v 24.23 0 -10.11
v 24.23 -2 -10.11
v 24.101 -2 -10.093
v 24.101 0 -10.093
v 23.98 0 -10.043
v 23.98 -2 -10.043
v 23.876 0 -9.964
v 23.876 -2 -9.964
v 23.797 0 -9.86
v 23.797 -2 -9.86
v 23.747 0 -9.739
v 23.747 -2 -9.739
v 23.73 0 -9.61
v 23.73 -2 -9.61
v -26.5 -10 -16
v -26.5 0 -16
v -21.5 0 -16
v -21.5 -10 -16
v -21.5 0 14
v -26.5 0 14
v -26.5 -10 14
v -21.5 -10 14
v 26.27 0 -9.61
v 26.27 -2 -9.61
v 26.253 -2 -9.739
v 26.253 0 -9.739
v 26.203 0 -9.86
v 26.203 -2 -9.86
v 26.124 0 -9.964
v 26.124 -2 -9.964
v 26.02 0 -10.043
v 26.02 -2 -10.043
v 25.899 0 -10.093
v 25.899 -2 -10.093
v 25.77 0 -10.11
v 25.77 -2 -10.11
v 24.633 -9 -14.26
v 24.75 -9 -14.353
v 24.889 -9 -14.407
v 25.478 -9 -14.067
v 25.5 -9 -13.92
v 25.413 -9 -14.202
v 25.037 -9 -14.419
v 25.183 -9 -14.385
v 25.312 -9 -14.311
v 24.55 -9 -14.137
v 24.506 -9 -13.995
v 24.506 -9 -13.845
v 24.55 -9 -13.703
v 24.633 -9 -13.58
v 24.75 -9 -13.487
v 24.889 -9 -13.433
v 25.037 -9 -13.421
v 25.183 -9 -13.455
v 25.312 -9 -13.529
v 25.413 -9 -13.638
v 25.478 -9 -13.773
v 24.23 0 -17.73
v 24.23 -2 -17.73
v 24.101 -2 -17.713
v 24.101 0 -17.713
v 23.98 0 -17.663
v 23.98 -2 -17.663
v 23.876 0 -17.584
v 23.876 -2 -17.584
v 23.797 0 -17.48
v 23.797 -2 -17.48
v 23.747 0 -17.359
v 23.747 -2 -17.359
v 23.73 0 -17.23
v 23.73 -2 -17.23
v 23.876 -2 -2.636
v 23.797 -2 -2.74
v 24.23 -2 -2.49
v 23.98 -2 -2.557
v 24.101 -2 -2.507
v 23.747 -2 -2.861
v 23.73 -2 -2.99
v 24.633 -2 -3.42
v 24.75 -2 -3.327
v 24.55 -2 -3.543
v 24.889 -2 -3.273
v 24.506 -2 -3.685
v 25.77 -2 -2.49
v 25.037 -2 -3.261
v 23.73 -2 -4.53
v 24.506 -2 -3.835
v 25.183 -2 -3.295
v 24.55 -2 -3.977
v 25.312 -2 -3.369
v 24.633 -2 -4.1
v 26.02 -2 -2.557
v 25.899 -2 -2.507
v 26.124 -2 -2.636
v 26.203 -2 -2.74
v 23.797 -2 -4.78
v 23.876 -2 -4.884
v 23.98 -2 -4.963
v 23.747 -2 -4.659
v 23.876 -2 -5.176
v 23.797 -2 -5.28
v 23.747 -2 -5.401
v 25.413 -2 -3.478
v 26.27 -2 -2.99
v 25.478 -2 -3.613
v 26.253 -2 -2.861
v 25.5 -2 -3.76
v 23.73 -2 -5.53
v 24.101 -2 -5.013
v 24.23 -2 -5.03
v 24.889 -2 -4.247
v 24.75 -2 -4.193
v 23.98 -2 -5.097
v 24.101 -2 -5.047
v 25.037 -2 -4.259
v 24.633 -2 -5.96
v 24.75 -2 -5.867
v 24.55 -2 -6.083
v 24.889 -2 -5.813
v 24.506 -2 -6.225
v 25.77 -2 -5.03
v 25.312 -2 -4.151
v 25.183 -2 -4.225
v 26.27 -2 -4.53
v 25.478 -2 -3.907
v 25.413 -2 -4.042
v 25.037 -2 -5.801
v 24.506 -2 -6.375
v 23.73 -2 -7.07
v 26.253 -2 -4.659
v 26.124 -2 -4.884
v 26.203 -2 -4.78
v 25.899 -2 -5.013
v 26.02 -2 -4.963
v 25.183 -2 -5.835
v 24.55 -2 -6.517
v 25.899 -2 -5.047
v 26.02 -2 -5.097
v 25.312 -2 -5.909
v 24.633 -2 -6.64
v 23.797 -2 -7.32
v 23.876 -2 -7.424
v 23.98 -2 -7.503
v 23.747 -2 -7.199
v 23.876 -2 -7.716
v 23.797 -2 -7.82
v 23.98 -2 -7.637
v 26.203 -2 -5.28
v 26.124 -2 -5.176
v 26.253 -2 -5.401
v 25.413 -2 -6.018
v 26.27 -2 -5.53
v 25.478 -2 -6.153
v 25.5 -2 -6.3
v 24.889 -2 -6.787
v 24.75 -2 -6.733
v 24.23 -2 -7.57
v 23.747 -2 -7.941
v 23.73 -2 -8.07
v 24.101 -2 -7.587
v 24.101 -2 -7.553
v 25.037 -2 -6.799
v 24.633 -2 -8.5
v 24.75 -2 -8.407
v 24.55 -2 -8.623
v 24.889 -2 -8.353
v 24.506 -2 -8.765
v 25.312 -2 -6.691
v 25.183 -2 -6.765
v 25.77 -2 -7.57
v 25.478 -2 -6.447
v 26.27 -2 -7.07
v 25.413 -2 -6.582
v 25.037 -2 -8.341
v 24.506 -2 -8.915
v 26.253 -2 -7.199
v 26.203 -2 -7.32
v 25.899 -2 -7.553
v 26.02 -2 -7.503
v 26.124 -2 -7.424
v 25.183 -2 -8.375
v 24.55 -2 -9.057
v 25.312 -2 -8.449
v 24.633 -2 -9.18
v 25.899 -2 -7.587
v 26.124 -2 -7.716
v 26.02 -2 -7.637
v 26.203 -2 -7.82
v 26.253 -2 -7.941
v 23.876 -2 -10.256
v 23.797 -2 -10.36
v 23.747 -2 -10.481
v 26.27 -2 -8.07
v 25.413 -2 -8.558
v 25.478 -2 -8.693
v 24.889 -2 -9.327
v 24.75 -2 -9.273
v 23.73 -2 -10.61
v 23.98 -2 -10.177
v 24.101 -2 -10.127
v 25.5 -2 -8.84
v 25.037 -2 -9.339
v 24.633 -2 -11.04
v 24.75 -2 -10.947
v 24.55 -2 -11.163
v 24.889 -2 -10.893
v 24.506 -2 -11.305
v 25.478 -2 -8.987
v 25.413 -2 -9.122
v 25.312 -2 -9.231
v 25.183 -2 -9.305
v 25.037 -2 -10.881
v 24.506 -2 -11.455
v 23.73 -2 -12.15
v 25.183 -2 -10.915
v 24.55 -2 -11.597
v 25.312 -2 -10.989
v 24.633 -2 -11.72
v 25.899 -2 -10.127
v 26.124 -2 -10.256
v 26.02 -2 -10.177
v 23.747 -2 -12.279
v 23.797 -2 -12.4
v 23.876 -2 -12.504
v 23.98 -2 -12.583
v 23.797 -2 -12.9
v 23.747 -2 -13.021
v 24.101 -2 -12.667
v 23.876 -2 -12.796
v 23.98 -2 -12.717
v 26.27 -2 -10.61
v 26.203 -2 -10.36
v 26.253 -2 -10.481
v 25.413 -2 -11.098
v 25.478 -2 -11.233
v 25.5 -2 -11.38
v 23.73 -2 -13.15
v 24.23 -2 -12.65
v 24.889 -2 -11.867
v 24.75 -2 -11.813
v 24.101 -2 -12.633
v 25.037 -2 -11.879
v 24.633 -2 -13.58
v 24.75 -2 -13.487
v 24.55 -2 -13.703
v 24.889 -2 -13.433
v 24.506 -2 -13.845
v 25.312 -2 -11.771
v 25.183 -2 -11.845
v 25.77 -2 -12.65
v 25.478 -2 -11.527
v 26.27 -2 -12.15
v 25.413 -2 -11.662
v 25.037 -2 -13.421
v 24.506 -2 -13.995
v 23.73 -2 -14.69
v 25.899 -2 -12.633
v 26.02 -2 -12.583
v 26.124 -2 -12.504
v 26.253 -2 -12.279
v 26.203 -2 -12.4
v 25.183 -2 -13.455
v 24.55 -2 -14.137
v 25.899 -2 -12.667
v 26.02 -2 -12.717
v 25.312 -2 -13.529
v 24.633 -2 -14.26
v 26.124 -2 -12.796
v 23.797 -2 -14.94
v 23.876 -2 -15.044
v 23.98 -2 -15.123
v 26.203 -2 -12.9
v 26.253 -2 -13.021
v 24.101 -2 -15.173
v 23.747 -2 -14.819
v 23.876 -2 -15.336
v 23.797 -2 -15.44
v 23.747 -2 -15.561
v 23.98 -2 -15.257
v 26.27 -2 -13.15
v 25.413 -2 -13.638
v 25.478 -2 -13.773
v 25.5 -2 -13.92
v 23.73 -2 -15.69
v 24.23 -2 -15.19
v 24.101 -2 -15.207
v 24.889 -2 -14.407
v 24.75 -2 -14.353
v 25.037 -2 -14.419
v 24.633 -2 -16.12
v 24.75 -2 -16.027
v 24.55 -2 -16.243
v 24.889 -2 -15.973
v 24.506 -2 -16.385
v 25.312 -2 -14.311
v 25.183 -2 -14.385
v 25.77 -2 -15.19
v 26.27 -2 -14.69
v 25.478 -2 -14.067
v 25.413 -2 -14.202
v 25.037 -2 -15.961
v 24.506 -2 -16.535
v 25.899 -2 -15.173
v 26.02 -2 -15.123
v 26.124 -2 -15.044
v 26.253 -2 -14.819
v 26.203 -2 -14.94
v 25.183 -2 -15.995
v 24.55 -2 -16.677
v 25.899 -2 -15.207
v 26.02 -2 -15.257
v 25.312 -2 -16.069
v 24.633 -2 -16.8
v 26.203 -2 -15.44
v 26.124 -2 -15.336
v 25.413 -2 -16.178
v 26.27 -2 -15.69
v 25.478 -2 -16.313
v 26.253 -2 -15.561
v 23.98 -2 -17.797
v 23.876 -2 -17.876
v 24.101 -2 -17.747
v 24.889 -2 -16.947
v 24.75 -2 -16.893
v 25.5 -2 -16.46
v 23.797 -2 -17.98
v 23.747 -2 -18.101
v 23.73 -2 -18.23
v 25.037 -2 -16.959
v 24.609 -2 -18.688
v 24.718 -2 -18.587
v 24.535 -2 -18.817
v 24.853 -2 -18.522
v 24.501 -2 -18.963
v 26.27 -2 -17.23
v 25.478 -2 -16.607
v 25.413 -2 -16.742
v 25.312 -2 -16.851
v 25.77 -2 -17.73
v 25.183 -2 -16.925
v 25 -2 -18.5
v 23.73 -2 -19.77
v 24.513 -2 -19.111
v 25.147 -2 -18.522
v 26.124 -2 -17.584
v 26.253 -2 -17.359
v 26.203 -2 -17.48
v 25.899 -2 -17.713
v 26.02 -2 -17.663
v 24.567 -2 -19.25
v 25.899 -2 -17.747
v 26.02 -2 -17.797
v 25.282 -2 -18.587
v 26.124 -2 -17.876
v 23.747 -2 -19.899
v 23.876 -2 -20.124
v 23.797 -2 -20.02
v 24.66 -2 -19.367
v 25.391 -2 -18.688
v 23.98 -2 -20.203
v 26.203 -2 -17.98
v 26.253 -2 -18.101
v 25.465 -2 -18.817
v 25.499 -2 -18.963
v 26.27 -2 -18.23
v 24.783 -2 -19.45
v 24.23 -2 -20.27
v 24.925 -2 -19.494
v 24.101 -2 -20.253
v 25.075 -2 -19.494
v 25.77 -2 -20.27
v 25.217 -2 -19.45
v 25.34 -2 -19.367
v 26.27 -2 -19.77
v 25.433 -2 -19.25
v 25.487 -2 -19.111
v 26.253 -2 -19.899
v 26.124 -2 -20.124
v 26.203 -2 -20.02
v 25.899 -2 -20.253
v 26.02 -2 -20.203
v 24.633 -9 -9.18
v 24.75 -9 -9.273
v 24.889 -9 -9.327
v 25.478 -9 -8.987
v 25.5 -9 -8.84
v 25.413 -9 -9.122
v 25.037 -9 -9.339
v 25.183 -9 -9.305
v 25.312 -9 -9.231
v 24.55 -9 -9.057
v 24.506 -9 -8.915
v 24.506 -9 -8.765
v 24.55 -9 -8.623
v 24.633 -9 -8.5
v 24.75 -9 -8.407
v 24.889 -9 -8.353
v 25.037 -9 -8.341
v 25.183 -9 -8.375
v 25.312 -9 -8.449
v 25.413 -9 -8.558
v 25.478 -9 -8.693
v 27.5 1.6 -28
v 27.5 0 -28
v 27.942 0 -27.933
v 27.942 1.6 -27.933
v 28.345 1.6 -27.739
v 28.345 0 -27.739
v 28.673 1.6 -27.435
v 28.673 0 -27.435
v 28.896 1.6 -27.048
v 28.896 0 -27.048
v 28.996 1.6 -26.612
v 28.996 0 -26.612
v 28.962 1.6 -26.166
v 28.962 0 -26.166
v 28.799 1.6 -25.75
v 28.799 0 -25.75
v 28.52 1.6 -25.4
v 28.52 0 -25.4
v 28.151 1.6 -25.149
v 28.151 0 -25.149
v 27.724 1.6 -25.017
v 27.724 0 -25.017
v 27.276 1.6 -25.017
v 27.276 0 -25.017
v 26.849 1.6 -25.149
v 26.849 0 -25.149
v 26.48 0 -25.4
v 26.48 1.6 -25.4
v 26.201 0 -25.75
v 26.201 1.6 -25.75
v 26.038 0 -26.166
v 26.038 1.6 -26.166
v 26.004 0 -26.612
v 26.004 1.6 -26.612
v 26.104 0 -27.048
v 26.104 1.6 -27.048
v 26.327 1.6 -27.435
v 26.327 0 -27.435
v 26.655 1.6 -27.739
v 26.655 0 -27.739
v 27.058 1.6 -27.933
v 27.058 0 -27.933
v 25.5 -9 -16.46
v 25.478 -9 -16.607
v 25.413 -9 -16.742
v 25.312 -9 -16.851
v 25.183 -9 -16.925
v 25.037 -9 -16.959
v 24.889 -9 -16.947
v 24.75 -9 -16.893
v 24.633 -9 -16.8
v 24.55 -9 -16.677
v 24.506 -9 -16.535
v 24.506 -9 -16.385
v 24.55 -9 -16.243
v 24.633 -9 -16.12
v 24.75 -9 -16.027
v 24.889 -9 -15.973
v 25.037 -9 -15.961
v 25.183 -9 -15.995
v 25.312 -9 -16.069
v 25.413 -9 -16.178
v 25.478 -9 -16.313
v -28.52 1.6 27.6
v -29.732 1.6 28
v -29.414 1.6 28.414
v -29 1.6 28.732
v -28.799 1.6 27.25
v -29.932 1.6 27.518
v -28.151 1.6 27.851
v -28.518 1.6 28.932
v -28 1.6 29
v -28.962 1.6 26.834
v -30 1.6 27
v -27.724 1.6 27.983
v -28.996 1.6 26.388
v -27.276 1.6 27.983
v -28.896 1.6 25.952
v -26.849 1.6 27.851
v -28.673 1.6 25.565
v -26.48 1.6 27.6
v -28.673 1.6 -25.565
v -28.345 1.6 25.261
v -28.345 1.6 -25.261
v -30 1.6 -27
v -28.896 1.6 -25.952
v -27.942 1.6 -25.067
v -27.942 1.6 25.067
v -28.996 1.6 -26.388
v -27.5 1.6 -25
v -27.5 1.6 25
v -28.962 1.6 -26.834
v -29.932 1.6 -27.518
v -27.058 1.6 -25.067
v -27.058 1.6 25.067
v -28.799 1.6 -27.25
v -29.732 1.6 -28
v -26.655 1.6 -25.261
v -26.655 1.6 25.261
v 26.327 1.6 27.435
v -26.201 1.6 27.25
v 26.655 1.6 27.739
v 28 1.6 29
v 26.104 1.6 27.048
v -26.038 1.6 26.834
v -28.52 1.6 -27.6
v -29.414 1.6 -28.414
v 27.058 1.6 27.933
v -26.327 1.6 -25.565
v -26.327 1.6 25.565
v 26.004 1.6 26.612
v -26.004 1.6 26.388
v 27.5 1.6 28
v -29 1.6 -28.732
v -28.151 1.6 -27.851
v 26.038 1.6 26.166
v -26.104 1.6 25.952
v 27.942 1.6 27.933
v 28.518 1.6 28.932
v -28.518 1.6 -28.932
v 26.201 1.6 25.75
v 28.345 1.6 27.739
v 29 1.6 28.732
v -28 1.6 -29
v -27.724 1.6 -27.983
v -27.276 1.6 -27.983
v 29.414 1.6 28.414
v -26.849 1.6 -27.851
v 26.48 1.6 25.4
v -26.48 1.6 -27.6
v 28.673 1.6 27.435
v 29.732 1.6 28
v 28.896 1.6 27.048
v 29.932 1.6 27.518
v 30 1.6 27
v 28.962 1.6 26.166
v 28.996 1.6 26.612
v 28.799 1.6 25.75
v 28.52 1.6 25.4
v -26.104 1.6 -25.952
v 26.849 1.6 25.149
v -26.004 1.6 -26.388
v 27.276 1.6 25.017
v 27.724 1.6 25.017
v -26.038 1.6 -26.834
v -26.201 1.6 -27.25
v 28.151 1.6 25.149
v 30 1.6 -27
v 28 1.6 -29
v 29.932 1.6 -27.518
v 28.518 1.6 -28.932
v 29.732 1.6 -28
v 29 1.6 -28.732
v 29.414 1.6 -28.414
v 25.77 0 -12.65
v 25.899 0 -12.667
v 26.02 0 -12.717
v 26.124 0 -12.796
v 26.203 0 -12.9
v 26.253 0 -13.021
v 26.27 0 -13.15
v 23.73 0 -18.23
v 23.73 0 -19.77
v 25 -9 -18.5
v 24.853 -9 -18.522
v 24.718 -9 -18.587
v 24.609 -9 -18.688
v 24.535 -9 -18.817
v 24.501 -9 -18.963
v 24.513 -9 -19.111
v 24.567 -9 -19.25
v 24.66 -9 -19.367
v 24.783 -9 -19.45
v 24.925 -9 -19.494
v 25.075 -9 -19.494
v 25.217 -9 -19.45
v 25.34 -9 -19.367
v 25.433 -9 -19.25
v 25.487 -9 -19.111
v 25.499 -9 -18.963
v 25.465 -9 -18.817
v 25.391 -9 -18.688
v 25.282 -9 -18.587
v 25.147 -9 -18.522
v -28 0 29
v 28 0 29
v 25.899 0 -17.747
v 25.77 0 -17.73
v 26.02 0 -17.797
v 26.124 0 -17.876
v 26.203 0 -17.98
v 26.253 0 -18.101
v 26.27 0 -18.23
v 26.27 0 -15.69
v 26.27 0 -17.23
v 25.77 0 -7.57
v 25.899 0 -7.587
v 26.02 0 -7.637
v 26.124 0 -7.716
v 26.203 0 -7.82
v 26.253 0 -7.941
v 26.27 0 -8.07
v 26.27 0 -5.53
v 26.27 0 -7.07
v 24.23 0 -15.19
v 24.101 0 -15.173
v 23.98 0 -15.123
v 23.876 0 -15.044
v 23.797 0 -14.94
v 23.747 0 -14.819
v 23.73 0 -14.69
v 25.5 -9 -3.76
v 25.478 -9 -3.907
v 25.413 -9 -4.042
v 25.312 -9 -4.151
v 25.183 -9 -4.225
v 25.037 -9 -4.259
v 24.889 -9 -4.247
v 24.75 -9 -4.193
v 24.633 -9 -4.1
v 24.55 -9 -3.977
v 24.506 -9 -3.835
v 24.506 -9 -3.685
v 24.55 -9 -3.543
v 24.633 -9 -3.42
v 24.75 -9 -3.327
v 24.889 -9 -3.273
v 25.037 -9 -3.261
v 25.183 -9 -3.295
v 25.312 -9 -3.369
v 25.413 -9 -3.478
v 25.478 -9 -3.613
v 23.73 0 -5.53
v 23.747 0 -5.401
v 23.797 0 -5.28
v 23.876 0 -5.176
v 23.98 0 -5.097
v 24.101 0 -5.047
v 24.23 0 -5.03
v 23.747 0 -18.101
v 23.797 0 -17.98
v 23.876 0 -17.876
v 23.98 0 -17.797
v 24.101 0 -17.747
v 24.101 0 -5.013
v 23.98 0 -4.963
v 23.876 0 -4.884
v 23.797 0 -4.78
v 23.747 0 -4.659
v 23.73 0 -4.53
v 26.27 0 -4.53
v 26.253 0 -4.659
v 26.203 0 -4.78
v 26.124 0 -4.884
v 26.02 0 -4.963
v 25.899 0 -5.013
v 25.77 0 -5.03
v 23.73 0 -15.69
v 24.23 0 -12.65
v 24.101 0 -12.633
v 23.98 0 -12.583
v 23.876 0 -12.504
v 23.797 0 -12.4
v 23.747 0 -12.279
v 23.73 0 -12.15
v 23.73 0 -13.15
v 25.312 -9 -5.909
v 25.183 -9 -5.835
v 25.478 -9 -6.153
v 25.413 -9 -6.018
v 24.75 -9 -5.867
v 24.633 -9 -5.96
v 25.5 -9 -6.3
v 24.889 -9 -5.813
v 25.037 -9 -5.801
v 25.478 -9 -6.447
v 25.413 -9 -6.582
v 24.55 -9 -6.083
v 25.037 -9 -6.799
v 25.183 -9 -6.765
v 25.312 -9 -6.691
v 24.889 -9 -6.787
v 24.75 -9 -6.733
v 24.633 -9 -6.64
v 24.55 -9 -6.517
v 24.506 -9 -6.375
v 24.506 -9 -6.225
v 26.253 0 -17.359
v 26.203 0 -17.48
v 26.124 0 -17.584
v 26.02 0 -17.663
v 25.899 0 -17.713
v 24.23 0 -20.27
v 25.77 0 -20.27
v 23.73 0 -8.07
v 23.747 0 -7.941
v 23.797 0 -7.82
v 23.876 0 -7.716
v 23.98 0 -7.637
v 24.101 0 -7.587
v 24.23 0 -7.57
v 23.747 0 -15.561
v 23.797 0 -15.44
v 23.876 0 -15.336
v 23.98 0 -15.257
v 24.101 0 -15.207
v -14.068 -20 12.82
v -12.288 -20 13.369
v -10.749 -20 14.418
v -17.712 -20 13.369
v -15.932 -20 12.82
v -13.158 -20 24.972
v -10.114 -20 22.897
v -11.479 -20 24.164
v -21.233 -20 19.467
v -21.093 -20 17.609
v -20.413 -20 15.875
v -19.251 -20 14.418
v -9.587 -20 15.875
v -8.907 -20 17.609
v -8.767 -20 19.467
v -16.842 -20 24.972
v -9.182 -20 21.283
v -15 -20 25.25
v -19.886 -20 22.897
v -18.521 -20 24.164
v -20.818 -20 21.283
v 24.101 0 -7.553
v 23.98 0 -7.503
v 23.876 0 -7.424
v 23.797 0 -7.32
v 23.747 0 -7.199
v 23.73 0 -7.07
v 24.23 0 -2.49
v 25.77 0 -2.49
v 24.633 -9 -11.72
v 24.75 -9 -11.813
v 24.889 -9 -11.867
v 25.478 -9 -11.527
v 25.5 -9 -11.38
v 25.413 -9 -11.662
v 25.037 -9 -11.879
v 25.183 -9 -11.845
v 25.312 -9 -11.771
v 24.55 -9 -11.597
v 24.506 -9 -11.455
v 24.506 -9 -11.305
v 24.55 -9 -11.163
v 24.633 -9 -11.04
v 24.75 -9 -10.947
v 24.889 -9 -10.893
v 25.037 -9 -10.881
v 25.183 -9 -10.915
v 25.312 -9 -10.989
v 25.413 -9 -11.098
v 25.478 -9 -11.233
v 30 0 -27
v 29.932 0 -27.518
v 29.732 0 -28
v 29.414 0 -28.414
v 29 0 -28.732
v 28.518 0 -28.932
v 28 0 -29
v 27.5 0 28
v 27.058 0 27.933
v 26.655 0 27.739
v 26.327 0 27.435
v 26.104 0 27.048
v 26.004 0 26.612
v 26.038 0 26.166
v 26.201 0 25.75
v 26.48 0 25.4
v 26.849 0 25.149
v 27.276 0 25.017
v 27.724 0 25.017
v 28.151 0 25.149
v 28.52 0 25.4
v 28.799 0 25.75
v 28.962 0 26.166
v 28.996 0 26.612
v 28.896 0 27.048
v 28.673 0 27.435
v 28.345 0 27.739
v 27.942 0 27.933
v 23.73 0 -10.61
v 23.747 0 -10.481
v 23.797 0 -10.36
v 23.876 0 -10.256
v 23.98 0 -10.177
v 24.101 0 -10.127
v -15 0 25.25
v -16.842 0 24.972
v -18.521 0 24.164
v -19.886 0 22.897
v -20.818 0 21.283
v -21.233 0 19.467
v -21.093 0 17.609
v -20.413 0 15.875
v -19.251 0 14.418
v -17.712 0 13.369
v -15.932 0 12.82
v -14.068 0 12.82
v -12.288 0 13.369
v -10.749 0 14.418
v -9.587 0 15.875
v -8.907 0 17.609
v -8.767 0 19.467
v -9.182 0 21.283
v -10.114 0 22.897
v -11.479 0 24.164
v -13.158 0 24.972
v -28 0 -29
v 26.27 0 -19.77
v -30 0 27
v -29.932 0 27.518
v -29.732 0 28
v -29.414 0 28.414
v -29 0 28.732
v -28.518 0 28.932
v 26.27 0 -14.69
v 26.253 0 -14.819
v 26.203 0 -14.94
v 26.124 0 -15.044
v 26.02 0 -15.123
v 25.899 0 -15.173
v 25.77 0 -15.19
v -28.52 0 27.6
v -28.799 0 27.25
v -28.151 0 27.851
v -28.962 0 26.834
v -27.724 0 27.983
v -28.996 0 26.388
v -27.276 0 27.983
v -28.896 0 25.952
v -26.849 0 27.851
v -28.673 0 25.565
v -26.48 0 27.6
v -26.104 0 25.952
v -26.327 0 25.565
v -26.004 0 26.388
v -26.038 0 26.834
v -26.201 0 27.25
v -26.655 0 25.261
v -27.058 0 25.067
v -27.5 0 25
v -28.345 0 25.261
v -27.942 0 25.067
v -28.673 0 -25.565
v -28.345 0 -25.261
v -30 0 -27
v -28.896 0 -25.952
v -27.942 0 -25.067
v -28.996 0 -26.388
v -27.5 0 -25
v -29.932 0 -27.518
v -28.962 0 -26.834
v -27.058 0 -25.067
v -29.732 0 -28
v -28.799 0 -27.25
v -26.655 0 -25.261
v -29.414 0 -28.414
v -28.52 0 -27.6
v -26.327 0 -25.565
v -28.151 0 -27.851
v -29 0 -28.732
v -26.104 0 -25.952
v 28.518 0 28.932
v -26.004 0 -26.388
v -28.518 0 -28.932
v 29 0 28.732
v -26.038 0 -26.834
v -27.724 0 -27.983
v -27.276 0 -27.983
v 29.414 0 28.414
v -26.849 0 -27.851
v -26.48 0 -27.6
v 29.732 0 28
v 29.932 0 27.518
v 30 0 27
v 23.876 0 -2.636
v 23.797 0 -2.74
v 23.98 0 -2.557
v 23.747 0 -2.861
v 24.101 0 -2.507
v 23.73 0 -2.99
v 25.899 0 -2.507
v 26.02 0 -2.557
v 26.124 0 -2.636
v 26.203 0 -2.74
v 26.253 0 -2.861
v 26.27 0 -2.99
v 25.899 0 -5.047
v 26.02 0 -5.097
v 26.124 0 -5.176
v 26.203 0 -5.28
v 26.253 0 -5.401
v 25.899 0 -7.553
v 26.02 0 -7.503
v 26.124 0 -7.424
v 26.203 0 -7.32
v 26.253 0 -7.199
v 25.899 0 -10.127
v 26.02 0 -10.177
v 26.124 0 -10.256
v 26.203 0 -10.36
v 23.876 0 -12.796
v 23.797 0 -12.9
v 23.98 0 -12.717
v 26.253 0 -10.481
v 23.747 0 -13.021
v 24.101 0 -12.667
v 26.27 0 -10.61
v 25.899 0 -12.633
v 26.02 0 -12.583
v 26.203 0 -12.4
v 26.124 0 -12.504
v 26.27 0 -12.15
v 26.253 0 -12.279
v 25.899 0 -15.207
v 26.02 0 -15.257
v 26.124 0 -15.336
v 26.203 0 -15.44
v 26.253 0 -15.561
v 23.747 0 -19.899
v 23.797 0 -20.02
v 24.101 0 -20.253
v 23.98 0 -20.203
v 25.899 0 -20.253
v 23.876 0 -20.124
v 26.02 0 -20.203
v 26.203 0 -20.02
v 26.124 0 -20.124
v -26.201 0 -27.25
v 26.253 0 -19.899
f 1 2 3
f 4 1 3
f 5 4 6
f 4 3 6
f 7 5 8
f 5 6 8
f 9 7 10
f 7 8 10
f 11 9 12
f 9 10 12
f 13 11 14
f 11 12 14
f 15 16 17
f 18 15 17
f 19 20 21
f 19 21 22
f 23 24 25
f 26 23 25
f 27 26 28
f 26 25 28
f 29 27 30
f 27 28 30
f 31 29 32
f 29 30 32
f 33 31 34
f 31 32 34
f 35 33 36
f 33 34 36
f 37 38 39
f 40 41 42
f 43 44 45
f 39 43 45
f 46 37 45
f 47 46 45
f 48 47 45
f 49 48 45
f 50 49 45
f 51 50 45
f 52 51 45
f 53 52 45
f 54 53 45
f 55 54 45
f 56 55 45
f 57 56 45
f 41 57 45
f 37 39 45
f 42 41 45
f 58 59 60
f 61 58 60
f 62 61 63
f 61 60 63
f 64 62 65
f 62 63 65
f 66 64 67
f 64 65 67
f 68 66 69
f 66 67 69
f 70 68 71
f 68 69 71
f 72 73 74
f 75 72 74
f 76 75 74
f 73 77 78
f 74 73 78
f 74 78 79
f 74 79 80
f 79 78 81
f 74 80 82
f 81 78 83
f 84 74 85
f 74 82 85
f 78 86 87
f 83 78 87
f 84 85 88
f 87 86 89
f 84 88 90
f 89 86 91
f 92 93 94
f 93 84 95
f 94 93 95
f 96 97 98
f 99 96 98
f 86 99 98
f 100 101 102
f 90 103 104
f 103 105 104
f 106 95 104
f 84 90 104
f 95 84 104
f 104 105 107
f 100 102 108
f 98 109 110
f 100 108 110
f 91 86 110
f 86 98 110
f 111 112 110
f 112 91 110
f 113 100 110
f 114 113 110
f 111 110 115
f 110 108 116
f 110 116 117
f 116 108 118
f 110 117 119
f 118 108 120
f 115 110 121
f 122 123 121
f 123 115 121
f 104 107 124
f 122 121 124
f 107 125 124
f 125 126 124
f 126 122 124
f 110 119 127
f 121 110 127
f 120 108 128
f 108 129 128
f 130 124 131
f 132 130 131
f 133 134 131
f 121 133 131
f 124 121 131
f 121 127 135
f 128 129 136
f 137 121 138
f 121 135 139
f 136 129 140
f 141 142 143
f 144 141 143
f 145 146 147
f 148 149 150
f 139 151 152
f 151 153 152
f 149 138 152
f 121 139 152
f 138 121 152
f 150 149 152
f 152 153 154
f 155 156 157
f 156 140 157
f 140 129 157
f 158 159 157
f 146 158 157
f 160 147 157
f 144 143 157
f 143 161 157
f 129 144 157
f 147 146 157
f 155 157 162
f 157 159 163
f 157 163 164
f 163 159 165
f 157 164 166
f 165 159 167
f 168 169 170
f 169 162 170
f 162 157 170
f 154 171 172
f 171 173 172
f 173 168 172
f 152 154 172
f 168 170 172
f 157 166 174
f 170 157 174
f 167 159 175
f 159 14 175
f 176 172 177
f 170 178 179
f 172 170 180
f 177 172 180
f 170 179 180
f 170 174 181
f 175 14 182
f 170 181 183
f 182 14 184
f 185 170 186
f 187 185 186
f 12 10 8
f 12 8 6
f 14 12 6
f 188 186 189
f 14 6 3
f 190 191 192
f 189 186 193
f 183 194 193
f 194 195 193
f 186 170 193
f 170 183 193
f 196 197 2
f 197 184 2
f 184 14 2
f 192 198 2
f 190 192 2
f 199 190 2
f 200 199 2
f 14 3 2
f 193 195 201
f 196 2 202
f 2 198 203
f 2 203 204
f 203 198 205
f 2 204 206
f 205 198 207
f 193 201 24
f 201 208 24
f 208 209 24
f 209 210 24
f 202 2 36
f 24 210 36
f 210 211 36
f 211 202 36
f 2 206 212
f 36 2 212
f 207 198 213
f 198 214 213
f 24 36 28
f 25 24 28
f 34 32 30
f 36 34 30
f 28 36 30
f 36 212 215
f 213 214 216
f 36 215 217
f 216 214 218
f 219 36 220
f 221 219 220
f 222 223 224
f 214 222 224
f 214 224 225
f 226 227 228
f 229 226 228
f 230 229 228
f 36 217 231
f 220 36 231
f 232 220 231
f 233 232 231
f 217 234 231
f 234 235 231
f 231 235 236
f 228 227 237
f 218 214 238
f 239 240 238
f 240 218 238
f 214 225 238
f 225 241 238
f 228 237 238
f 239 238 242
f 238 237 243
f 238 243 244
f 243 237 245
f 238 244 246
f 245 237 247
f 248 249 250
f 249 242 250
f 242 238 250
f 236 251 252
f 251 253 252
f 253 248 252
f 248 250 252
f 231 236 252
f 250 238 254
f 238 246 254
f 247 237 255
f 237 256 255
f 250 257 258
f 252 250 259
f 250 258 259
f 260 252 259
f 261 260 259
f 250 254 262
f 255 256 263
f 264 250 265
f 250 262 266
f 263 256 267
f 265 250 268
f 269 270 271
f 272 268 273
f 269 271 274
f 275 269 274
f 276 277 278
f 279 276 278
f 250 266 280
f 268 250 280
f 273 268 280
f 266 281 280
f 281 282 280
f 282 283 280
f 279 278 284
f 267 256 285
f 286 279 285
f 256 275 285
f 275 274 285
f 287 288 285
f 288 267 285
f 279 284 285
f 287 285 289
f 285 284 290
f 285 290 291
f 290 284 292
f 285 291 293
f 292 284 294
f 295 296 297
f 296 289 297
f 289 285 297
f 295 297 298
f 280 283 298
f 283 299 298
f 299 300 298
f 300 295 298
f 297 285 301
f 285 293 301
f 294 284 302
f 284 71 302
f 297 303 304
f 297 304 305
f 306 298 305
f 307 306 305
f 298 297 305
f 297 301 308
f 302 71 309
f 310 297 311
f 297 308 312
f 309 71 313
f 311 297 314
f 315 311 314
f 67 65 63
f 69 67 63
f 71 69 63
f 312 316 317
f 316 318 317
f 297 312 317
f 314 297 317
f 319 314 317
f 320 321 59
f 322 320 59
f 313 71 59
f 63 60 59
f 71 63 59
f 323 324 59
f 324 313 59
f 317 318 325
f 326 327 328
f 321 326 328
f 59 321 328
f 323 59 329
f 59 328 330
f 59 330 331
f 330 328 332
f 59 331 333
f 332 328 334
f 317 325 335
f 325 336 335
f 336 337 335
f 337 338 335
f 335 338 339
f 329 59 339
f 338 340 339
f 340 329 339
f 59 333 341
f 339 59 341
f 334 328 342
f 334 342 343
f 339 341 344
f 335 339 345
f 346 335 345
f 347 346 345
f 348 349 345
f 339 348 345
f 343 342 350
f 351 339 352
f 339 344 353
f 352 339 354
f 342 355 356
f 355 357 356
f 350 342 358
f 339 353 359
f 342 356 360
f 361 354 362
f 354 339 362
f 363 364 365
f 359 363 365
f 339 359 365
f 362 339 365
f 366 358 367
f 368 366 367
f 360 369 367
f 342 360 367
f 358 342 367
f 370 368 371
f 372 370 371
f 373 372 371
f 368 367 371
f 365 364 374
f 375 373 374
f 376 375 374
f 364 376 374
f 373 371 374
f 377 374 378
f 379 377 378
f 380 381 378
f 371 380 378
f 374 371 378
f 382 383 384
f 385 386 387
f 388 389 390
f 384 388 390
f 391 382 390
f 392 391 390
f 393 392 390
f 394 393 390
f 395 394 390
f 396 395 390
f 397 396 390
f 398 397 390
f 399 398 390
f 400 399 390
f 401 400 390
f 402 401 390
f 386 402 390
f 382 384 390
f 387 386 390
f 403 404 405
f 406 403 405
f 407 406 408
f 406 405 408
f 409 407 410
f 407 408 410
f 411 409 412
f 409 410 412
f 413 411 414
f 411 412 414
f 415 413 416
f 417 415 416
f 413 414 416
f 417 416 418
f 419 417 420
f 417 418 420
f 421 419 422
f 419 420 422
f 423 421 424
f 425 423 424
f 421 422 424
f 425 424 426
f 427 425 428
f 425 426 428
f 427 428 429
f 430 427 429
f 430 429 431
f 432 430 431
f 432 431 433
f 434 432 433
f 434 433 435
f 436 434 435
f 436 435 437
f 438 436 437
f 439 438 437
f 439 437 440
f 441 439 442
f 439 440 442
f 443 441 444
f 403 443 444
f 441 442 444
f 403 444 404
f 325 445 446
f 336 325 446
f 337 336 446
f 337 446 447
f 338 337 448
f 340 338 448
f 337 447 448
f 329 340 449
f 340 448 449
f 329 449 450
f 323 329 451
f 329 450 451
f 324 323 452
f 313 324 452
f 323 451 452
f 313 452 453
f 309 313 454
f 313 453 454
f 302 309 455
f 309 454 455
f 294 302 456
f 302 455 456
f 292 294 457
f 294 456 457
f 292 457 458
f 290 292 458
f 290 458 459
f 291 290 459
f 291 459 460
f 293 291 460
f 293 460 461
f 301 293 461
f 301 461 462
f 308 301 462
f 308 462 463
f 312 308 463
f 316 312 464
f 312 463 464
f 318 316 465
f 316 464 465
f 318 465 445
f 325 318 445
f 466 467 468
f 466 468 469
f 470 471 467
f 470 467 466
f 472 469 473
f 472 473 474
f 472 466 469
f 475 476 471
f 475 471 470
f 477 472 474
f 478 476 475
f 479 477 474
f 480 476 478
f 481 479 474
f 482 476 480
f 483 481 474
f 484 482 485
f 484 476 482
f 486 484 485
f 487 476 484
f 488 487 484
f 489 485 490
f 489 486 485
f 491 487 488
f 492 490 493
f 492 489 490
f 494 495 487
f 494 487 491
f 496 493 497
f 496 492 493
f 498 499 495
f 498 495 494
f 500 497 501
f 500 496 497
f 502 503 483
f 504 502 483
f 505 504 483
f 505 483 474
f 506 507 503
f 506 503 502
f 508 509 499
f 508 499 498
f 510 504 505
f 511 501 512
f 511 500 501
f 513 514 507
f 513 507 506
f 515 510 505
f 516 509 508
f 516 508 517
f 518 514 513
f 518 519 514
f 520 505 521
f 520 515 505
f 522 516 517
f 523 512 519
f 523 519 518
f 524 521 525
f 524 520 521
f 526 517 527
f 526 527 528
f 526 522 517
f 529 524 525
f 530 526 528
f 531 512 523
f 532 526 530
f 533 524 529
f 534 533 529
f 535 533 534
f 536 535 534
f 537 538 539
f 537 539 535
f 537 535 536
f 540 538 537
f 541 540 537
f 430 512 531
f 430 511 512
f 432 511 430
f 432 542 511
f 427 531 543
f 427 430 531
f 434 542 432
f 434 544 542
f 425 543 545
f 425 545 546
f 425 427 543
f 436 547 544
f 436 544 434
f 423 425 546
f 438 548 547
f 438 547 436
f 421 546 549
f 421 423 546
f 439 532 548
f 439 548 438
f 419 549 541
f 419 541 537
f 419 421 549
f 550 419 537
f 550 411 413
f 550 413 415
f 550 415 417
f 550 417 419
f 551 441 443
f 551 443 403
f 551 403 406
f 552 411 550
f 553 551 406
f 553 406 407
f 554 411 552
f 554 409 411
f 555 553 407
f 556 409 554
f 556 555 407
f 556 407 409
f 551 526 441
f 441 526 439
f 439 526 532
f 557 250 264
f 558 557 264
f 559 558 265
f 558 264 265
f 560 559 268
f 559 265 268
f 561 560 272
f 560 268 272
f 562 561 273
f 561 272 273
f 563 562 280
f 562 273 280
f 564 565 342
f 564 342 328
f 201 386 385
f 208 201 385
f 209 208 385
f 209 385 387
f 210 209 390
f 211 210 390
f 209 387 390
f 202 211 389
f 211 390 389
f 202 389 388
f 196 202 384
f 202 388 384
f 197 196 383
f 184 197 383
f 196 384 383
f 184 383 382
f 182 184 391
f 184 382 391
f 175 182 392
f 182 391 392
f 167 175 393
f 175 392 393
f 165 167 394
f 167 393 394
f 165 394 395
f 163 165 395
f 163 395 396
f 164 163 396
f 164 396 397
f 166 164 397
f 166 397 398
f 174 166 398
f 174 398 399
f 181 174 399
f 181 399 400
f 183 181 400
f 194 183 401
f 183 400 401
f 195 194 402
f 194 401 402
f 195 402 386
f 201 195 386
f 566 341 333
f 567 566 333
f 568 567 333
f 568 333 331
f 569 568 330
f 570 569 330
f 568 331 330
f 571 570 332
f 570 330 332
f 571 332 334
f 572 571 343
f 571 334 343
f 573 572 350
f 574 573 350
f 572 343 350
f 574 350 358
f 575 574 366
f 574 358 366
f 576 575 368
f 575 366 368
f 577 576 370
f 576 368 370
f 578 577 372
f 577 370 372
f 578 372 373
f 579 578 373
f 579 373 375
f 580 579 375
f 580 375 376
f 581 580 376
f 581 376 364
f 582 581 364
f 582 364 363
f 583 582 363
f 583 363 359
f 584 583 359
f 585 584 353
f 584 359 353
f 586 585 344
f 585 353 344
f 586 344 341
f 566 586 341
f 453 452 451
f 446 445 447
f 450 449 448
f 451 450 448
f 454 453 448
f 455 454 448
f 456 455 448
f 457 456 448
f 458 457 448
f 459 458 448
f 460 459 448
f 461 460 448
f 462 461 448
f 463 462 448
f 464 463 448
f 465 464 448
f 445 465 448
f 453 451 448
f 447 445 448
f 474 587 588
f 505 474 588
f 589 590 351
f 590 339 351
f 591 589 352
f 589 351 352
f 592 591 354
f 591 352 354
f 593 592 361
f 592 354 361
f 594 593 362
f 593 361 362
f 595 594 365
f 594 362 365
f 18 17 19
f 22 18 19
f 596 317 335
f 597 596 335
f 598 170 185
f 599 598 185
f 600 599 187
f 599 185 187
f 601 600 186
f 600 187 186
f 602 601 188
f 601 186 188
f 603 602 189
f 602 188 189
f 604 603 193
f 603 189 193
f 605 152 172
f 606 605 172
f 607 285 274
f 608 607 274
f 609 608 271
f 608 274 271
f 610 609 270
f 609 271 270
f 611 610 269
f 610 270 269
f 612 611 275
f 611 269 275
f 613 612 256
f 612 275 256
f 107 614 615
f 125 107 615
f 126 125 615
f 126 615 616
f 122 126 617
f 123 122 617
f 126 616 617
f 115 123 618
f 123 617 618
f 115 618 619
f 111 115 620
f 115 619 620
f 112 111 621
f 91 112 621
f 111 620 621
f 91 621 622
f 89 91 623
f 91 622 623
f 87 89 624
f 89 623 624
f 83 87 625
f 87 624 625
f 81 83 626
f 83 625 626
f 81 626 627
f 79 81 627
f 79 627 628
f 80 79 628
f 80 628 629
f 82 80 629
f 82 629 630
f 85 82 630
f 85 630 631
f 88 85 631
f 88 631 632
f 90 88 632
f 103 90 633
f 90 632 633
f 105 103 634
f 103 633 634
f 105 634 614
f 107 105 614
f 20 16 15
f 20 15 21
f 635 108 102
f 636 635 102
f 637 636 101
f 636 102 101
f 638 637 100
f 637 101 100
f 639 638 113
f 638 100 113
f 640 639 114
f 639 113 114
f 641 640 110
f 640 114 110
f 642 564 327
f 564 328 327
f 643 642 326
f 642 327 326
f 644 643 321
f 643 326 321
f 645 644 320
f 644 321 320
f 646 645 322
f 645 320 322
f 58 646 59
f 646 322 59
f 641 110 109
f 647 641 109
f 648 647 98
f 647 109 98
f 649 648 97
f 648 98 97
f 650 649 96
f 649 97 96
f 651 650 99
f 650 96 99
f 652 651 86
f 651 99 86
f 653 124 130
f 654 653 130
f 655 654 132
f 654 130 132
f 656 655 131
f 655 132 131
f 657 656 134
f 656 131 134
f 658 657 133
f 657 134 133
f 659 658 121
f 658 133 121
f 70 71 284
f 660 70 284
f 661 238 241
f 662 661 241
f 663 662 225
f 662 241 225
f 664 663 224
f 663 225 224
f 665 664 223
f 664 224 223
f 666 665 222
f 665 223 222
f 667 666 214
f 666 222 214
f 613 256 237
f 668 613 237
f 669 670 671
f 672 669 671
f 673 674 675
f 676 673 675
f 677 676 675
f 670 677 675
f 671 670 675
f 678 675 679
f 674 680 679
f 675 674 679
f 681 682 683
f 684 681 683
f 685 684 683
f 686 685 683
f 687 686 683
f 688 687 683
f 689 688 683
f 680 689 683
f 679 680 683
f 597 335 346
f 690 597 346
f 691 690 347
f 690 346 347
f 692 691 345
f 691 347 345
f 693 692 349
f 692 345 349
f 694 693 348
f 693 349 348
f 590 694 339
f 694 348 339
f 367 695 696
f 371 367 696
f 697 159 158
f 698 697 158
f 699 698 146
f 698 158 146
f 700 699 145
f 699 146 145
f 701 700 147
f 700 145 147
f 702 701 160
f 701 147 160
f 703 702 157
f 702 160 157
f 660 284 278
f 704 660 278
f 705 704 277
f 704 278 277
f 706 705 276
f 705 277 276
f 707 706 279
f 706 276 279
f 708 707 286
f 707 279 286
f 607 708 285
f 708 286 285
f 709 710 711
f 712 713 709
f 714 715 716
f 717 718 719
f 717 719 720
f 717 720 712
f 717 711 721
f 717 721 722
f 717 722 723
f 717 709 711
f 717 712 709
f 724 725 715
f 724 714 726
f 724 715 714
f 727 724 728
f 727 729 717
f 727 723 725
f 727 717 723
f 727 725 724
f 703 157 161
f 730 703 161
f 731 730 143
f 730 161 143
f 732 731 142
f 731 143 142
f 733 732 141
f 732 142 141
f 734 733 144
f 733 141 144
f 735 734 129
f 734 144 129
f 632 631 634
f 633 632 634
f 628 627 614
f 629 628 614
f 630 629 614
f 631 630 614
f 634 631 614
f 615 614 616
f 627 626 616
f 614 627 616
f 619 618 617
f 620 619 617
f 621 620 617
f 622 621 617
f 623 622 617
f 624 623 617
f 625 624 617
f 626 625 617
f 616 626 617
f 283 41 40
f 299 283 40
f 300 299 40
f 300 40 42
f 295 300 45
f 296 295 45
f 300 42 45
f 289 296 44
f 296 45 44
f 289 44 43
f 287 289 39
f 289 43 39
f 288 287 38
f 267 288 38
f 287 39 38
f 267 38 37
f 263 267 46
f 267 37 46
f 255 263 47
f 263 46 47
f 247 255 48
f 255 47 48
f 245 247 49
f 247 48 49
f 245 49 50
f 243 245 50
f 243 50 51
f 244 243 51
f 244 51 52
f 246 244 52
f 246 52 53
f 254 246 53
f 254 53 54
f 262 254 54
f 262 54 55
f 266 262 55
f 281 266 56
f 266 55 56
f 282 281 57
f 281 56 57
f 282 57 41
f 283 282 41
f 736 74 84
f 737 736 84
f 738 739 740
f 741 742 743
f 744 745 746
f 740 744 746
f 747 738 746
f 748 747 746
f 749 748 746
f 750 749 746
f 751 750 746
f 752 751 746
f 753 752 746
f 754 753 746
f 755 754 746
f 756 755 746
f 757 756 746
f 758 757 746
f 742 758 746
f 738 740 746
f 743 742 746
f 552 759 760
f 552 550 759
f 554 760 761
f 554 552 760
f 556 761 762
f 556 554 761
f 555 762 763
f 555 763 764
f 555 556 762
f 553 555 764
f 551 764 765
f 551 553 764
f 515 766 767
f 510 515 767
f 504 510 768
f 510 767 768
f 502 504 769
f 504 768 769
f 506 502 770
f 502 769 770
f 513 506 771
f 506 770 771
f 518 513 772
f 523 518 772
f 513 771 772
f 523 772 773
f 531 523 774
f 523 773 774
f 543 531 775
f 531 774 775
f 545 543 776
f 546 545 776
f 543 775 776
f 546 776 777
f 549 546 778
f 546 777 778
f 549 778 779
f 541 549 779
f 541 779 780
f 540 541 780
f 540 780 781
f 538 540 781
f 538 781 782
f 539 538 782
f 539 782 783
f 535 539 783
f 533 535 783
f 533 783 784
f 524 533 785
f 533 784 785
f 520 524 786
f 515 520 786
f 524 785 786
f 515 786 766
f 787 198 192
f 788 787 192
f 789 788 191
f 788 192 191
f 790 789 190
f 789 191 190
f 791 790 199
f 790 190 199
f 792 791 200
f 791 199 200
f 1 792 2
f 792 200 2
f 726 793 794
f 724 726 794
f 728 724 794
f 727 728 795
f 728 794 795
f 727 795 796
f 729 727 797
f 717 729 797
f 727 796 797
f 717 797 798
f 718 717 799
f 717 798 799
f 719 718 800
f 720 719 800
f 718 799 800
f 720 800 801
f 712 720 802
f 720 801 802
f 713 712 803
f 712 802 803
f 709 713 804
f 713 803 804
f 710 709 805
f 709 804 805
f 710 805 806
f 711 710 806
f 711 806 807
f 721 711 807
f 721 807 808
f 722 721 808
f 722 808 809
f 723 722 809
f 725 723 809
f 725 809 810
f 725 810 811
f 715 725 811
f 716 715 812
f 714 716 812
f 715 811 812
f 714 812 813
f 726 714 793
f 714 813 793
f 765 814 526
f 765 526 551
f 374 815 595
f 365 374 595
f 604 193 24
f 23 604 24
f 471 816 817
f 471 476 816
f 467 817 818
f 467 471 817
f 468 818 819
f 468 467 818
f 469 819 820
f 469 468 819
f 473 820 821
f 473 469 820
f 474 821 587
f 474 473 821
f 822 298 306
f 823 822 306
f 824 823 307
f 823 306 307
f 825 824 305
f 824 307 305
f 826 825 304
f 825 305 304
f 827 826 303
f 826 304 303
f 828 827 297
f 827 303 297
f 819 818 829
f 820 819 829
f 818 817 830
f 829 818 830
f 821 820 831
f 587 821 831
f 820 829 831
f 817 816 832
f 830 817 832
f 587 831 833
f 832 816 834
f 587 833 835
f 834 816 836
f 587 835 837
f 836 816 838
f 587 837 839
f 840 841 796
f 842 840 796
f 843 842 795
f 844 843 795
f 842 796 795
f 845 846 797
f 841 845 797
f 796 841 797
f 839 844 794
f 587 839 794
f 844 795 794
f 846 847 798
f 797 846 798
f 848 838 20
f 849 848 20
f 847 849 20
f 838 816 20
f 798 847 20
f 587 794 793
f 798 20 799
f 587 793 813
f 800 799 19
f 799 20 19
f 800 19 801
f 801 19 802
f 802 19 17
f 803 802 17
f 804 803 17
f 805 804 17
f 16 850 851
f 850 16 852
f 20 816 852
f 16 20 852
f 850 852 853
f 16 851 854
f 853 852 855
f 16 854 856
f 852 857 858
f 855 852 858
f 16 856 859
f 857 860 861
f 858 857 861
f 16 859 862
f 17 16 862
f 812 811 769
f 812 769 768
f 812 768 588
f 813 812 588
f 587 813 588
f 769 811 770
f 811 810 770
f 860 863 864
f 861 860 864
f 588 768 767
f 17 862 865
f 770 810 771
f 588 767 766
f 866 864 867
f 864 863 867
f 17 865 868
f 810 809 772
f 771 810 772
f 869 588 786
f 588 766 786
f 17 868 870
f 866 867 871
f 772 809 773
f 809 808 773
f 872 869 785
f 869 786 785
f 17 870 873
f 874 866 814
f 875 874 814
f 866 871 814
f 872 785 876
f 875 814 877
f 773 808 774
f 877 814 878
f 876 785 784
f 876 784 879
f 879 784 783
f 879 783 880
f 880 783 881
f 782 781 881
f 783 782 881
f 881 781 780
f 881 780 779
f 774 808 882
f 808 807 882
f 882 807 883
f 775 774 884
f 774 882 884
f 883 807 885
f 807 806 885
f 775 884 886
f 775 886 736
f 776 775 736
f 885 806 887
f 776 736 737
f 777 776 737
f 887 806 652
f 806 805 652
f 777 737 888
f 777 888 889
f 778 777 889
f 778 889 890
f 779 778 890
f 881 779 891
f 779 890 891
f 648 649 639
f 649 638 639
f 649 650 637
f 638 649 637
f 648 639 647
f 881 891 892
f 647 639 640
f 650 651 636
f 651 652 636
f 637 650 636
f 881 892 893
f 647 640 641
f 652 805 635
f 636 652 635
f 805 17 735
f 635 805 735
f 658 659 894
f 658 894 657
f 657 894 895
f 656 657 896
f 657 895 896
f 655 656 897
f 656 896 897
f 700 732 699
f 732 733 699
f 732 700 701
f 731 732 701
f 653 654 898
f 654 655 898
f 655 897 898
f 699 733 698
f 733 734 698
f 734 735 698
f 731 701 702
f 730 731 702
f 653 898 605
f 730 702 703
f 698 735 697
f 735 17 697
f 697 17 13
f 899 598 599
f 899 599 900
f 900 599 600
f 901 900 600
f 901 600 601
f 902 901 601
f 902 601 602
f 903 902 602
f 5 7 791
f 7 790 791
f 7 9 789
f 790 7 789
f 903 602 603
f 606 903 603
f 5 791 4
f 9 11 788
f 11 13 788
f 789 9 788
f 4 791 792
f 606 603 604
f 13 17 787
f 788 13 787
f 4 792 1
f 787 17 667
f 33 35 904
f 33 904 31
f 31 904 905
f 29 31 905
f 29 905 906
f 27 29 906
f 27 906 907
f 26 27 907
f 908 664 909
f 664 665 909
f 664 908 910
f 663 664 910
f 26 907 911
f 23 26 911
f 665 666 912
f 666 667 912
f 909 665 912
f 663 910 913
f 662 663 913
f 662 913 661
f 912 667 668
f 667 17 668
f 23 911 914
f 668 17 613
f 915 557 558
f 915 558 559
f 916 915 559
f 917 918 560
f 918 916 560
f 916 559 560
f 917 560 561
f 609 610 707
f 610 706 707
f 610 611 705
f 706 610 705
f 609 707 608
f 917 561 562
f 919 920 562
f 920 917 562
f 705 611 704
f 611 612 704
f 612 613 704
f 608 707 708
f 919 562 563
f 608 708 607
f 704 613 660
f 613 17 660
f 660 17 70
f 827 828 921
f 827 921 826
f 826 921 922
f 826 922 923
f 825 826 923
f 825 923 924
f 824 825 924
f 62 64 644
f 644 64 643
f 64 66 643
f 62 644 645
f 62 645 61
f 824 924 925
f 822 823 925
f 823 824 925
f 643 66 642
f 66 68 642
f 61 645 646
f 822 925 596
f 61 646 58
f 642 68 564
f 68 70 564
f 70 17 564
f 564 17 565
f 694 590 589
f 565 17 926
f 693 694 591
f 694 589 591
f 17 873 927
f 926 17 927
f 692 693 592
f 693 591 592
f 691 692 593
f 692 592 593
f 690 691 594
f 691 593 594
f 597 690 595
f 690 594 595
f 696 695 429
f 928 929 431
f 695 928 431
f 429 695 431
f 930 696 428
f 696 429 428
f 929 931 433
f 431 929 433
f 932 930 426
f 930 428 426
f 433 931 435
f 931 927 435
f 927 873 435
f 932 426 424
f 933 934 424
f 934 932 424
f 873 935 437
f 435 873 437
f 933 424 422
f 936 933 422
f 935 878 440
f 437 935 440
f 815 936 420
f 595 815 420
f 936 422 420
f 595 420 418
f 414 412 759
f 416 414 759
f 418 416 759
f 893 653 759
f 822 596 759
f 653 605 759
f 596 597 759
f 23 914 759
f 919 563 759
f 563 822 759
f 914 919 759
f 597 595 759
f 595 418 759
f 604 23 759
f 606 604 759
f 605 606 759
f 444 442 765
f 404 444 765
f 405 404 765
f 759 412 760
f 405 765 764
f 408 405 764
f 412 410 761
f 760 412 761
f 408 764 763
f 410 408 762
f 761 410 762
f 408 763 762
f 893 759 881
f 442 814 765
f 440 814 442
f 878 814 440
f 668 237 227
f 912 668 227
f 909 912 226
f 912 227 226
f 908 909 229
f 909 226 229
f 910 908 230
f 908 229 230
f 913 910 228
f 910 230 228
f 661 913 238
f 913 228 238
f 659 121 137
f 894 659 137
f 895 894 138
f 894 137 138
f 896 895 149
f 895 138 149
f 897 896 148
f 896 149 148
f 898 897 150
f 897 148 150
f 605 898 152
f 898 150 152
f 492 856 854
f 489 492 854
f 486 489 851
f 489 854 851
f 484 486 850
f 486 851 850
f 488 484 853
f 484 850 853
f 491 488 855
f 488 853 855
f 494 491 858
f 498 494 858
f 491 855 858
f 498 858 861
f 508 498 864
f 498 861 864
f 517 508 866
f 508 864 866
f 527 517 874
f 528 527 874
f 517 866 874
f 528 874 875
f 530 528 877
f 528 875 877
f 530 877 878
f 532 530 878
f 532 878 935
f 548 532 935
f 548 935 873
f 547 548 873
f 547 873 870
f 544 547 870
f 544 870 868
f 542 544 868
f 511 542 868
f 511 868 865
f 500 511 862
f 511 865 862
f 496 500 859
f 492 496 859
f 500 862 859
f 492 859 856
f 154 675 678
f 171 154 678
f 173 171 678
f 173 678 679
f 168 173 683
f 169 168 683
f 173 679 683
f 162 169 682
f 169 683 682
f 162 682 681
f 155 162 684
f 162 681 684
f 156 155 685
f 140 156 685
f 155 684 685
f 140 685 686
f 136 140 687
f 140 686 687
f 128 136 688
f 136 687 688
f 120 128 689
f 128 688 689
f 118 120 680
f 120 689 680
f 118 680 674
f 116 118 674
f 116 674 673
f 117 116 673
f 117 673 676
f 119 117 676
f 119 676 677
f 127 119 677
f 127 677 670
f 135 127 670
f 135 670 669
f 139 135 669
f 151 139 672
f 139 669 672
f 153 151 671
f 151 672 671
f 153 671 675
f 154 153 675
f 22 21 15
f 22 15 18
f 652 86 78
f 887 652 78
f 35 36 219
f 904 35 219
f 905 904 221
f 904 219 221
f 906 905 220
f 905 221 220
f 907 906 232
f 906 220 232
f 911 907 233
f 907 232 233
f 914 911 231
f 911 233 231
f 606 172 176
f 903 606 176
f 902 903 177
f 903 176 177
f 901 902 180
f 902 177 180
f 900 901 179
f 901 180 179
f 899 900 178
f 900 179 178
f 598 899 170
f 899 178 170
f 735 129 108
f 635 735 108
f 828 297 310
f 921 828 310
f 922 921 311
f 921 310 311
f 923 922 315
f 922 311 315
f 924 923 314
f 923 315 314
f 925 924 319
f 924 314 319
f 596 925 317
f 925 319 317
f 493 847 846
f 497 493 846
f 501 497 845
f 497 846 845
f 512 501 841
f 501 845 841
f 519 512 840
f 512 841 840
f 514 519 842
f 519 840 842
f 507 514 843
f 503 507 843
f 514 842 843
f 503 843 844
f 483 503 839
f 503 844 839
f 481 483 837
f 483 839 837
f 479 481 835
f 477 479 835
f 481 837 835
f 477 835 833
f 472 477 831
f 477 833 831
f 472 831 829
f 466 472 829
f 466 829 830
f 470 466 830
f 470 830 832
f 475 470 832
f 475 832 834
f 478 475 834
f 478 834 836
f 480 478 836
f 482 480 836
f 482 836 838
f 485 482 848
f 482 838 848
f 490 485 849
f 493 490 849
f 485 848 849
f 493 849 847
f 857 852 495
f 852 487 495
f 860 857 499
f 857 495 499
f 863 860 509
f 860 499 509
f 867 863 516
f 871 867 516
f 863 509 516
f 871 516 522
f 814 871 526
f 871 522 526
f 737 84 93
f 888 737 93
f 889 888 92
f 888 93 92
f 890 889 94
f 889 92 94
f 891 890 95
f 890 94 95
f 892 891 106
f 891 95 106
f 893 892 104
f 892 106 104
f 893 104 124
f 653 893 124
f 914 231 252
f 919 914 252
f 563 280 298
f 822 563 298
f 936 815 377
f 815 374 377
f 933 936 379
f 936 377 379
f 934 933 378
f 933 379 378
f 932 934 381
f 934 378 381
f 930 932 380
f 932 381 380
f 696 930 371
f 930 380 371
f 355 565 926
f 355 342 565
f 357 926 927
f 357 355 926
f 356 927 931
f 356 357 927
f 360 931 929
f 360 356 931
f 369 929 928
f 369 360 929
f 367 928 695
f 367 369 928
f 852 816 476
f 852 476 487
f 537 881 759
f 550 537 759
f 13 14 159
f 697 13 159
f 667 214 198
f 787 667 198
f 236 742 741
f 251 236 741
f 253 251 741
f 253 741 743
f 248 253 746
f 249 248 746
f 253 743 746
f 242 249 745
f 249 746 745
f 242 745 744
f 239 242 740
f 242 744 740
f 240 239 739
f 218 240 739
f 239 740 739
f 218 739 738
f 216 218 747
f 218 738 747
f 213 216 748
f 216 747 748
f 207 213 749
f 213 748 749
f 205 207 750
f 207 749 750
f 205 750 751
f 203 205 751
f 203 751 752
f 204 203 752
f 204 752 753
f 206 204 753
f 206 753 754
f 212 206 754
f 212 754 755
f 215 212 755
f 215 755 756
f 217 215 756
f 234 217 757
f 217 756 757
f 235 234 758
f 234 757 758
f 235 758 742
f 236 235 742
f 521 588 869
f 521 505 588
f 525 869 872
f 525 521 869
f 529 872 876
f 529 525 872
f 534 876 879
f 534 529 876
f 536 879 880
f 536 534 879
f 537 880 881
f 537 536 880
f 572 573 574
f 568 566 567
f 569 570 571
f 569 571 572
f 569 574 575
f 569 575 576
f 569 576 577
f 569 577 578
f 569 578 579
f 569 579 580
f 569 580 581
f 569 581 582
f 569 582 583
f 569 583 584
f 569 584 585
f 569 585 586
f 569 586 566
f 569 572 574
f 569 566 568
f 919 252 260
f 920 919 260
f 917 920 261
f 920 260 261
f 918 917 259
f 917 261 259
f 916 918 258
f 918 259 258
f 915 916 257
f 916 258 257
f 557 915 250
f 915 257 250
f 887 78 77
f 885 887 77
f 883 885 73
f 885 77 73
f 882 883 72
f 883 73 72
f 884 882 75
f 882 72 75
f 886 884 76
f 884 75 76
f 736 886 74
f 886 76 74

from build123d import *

# Parameters (mm, degrees)
SKETCH1_W             = 60
SKETCH1_H             = 58
BOSS_EXTRUDE1_DEPTH   = 1.6
FILLET1_R             = 2
SKETCH2_R             = 1.5
CUT_EXTRUDE1_DEPTH    = 1.6
SKETCH3_R             = 6.25
BOSS_EXTRUDE2_DEPTH   = 20
SKETCH4_W             = 5
SKETCH4_H             = 30
BOSS_EXTRUDE3_DEPTH   = 10
SKETCH5_W             = 2.54
SKETCH5_H             = 2.54
BOSS_EXTRUDE4_DEPTH   = 2
FILLET2_R             = 0.5
SKETCH6_R             = 0.5
BOSS_EXTRUDE5_DEPTH   = 7
LPATTERN1_START       = -2
LPATTERN1_DEPTH       = 2
LPATTERN1_START_2     = -9
LPATTERN1_2_OUTLINE_R = 0.5
LPATTERN1_2_DEPTH     = 7


# Read off the part's stored shape, not the designer's step: LPattern1
with BuildPart() as part:
    # Sketch1 → Boss-Extrude1 (new body)
    with BuildSketch(Plane(origin=(0, 0, 0), x_dir=(1, 0, 0), z_dir=(0, 1, 0))):
        Rectangle(SKETCH1_W, SKETCH1_H)
    extrude(amount=BOSS_EXTRUDE1_DEPTH)

    # Fillet1
    fillet1_edges = [part.edges().sort_by_distance(p)[0] for p in [
        (-30, 0.8, -29),
        (30, 0.8, -29),
        (30, 0.8, 29),
        (-30, 0.8, 29),
    ]]
    fillet(fillet1_edges, radius=FILLET1_R)

    # Sketch2 → Cut-Extrude1 (cut)
    with BuildSketch(Plane.XZ):
        with Locations(Location((-27.5, 26.5, 0), (0, 0, 270))):
            Circle(SKETCH2_R)
        with Locations(Location((-27.5, -26.5, 0), (0, 0, 90))):
            Circle(SKETCH2_R)
        with Locations(Location((27.5, -26.5, 0), (0, 0, 270))):
            Circle(SKETCH2_R)
        with Locations(Location((27.5, 26.5, 0), (0, 0, 90))):
            Circle(SKETCH2_R)
    extrude(amount=-CUT_EXTRUDE1_DEPTH, mode=Mode.SUBTRACT)

    # Sketch3 → Boss-Extrude2 (add)
    with BuildSketch(Plane.XZ):
        with Locations(Location((-15, 19, 0), (0, 0, 90))):
            Circle(SKETCH3_R)
    extrude(amount=BOSS_EXTRUDE2_DEPTH)

    # Sketch4 → Boss-Extrude3 (add)
    with BuildSketch(Plane.XZ):
        with Locations((-24, -1)):
            Rectangle(SKETCH4_W, SKETCH4_H)
    extrude(amount=BOSS_EXTRUDE3_DEPTH)

    # Sketch5 → Boss-Extrude4 (add)
    with BuildSketch(Plane.XZ):
        with Locations((25, -19)):
            Rectangle(SKETCH5_W, SKETCH5_H)
    extrude(amount=BOSS_EXTRUDE4_DEPTH)

    # Fillet2
    fillet2_edges = [part.edges().sort_by_distance(p)[0] for p in [
        (26.27, -1, -20.27),
        (26.27, -1, -17.73),
        (23.73, -1, -17.73),
        (23.73, -1, -20.27),
    ]]
    fillet(fillet2_edges, radius=FILLET2_R)

    # Sketch6 → Boss-Extrude5 (add)
    with BuildSketch(Plane.XZ.offset(2)):
        with Locations(Location((25, -19, 0), (0, 0, 90))):
            Circle(SKETCH6_R)
    extrude(amount=BOSS_EXTRUDE5_DEPTH)

    # LPattern1 outline → LPattern1 (add)
    with BuildSketch(Plane(origin=(0, 0, 0), x_dir=(1, 0, 0), z_dir=(0, 1, 0)).offset(LPATTERN1_START)):
        with BuildLine():
            Line((26.27, 15.69), (26.27, 17.23))
            ThreePointArc((26.27, 17.23), (26.123553391, 17.583553391), (25.77, 17.73))
            Line((25.77, 17.73), (24.23, 17.73))
            ThreePointArc((24.23, 17.73), (23.876446609, 17.583553391), (23.73, 17.23))
            Line((23.73, 17.23), (23.73, 15.69))
            ThreePointArc((23.73, 15.69), (23.876446609, 15.336446609), (24.23, 15.19))
            ThreePointArc((24.23, 15.19), (23.876446609, 15.043553391), (23.73, 14.69))
            Line((23.73, 14.69), (23.73, 13.15))
            ThreePointArc((23.73, 13.15), (23.876446609, 12.796446609), (24.23, 12.65))
            ThreePointArc((24.23, 12.65), (23.876446609, 12.503553391), (23.73, 12.15))
            Line((23.73, 12.15), (23.73, 10.61))
            ThreePointArc((23.73, 10.61), (23.876446609, 10.256446609), (24.23, 10.11))
            ThreePointArc((24.23, 10.11), (23.876446609, 9.963553391), (23.73, 9.61))
            Line((23.73, 9.61), (23.73, 8.07))
            ThreePointArc((23.73, 8.07), (23.876446609, 7.716446609), (24.23, 7.57))
            ThreePointArc((24.23, 7.57), (23.876446609, 7.423553391), (23.73, 7.07))
            Line((23.73, 7.07), (23.73, 5.53))
            ThreePointArc((23.73, 5.53), (23.876446609, 5.176446609), (24.23, 5.03))
            ThreePointArc((24.23, 5.03), (23.876446609, 4.883553391), (23.73, 4.53))
            Line((23.73, 4.53), (23.73, 2.99))
            ThreePointArc((23.73, 2.99), (23.876446609, 2.636446609), (24.23, 2.49))
            Line((24.23, 2.49), (25.77, 2.49))
            ThreePointArc((25.77, 2.49), (26.123553391, 2.636446609), (26.27, 2.99))
            Line((26.27, 2.99), (26.27, 4.53))
            ThreePointArc((26.27, 4.53), (26.123553391, 4.883553391), (25.77, 5.03))
            ThreePointArc((25.77, 5.03), (26.123553391, 5.176446609), (26.27, 5.53))
            Line((26.27, 5.53), (26.27, 7.07))
            ThreePointArc((26.27, 7.07), (26.123553391, 7.423553391), (25.77, 7.57))
            ThreePointArc((25.77, 7.57), (26.123553391, 7.716446609), (26.27, 8.07))
            Line((26.27, 8.07), (26.27, 9.61))
            ThreePointArc((26.27, 9.61), (26.123553391, 9.963553391), (25.77, 10.11))
            ThreePointArc((25.77, 10.11), (26.123553391, 10.256446609), (26.27, 10.61))
            Line((26.27, 10.61), (26.27, 12.15))
            ThreePointArc((26.27, 12.15), (26.123553391, 12.503553391), (25.77, 12.65))
            ThreePointArc((25.77, 12.65), (26.123553391, 12.796446609), (26.27, 13.15))
            Line((26.27, 13.15), (26.27, 14.69))
            ThreePointArc((26.27, 14.69), (26.123553391, 15.043553391), (25.77, 15.19))
            ThreePointArc((25.77, 15.19), (26.123553391, 15.336446609), (26.27, 15.69))
        make_face()
    extrude(amount=LPATTERN1_DEPTH)

    # LPattern1 2 outline → LPattern1 2 (add)
    with BuildSketch(Plane(origin=(0, 0, 0), x_dir=(1, 0, 0), z_dir=(0, 1, 0)).offset(LPATTERN1_START_2)):
        with Locations((25, 16.46)):
            Circle(LPATTERN1_2_OUTLINE_R)
        with Locations((25, 13.92)):
            Circle(LPATTERN1_2_OUTLINE_R)
        with Locations((25, 11.38)):
            Circle(LPATTERN1_2_OUTLINE_R)
        with Locations((25, 8.84)):
            Circle(LPATTERN1_2_OUTLINE_R)
        with Locations((25, 6.3)):
            Circle(LPATTERN1_2_OUTLINE_R)
        with Locations((25, 3.76)):
            Circle(LPATTERN1_2_OUTLINE_R)
    extrude(amount=LPATTERN1_2_DEPTH)


solid = part.part
